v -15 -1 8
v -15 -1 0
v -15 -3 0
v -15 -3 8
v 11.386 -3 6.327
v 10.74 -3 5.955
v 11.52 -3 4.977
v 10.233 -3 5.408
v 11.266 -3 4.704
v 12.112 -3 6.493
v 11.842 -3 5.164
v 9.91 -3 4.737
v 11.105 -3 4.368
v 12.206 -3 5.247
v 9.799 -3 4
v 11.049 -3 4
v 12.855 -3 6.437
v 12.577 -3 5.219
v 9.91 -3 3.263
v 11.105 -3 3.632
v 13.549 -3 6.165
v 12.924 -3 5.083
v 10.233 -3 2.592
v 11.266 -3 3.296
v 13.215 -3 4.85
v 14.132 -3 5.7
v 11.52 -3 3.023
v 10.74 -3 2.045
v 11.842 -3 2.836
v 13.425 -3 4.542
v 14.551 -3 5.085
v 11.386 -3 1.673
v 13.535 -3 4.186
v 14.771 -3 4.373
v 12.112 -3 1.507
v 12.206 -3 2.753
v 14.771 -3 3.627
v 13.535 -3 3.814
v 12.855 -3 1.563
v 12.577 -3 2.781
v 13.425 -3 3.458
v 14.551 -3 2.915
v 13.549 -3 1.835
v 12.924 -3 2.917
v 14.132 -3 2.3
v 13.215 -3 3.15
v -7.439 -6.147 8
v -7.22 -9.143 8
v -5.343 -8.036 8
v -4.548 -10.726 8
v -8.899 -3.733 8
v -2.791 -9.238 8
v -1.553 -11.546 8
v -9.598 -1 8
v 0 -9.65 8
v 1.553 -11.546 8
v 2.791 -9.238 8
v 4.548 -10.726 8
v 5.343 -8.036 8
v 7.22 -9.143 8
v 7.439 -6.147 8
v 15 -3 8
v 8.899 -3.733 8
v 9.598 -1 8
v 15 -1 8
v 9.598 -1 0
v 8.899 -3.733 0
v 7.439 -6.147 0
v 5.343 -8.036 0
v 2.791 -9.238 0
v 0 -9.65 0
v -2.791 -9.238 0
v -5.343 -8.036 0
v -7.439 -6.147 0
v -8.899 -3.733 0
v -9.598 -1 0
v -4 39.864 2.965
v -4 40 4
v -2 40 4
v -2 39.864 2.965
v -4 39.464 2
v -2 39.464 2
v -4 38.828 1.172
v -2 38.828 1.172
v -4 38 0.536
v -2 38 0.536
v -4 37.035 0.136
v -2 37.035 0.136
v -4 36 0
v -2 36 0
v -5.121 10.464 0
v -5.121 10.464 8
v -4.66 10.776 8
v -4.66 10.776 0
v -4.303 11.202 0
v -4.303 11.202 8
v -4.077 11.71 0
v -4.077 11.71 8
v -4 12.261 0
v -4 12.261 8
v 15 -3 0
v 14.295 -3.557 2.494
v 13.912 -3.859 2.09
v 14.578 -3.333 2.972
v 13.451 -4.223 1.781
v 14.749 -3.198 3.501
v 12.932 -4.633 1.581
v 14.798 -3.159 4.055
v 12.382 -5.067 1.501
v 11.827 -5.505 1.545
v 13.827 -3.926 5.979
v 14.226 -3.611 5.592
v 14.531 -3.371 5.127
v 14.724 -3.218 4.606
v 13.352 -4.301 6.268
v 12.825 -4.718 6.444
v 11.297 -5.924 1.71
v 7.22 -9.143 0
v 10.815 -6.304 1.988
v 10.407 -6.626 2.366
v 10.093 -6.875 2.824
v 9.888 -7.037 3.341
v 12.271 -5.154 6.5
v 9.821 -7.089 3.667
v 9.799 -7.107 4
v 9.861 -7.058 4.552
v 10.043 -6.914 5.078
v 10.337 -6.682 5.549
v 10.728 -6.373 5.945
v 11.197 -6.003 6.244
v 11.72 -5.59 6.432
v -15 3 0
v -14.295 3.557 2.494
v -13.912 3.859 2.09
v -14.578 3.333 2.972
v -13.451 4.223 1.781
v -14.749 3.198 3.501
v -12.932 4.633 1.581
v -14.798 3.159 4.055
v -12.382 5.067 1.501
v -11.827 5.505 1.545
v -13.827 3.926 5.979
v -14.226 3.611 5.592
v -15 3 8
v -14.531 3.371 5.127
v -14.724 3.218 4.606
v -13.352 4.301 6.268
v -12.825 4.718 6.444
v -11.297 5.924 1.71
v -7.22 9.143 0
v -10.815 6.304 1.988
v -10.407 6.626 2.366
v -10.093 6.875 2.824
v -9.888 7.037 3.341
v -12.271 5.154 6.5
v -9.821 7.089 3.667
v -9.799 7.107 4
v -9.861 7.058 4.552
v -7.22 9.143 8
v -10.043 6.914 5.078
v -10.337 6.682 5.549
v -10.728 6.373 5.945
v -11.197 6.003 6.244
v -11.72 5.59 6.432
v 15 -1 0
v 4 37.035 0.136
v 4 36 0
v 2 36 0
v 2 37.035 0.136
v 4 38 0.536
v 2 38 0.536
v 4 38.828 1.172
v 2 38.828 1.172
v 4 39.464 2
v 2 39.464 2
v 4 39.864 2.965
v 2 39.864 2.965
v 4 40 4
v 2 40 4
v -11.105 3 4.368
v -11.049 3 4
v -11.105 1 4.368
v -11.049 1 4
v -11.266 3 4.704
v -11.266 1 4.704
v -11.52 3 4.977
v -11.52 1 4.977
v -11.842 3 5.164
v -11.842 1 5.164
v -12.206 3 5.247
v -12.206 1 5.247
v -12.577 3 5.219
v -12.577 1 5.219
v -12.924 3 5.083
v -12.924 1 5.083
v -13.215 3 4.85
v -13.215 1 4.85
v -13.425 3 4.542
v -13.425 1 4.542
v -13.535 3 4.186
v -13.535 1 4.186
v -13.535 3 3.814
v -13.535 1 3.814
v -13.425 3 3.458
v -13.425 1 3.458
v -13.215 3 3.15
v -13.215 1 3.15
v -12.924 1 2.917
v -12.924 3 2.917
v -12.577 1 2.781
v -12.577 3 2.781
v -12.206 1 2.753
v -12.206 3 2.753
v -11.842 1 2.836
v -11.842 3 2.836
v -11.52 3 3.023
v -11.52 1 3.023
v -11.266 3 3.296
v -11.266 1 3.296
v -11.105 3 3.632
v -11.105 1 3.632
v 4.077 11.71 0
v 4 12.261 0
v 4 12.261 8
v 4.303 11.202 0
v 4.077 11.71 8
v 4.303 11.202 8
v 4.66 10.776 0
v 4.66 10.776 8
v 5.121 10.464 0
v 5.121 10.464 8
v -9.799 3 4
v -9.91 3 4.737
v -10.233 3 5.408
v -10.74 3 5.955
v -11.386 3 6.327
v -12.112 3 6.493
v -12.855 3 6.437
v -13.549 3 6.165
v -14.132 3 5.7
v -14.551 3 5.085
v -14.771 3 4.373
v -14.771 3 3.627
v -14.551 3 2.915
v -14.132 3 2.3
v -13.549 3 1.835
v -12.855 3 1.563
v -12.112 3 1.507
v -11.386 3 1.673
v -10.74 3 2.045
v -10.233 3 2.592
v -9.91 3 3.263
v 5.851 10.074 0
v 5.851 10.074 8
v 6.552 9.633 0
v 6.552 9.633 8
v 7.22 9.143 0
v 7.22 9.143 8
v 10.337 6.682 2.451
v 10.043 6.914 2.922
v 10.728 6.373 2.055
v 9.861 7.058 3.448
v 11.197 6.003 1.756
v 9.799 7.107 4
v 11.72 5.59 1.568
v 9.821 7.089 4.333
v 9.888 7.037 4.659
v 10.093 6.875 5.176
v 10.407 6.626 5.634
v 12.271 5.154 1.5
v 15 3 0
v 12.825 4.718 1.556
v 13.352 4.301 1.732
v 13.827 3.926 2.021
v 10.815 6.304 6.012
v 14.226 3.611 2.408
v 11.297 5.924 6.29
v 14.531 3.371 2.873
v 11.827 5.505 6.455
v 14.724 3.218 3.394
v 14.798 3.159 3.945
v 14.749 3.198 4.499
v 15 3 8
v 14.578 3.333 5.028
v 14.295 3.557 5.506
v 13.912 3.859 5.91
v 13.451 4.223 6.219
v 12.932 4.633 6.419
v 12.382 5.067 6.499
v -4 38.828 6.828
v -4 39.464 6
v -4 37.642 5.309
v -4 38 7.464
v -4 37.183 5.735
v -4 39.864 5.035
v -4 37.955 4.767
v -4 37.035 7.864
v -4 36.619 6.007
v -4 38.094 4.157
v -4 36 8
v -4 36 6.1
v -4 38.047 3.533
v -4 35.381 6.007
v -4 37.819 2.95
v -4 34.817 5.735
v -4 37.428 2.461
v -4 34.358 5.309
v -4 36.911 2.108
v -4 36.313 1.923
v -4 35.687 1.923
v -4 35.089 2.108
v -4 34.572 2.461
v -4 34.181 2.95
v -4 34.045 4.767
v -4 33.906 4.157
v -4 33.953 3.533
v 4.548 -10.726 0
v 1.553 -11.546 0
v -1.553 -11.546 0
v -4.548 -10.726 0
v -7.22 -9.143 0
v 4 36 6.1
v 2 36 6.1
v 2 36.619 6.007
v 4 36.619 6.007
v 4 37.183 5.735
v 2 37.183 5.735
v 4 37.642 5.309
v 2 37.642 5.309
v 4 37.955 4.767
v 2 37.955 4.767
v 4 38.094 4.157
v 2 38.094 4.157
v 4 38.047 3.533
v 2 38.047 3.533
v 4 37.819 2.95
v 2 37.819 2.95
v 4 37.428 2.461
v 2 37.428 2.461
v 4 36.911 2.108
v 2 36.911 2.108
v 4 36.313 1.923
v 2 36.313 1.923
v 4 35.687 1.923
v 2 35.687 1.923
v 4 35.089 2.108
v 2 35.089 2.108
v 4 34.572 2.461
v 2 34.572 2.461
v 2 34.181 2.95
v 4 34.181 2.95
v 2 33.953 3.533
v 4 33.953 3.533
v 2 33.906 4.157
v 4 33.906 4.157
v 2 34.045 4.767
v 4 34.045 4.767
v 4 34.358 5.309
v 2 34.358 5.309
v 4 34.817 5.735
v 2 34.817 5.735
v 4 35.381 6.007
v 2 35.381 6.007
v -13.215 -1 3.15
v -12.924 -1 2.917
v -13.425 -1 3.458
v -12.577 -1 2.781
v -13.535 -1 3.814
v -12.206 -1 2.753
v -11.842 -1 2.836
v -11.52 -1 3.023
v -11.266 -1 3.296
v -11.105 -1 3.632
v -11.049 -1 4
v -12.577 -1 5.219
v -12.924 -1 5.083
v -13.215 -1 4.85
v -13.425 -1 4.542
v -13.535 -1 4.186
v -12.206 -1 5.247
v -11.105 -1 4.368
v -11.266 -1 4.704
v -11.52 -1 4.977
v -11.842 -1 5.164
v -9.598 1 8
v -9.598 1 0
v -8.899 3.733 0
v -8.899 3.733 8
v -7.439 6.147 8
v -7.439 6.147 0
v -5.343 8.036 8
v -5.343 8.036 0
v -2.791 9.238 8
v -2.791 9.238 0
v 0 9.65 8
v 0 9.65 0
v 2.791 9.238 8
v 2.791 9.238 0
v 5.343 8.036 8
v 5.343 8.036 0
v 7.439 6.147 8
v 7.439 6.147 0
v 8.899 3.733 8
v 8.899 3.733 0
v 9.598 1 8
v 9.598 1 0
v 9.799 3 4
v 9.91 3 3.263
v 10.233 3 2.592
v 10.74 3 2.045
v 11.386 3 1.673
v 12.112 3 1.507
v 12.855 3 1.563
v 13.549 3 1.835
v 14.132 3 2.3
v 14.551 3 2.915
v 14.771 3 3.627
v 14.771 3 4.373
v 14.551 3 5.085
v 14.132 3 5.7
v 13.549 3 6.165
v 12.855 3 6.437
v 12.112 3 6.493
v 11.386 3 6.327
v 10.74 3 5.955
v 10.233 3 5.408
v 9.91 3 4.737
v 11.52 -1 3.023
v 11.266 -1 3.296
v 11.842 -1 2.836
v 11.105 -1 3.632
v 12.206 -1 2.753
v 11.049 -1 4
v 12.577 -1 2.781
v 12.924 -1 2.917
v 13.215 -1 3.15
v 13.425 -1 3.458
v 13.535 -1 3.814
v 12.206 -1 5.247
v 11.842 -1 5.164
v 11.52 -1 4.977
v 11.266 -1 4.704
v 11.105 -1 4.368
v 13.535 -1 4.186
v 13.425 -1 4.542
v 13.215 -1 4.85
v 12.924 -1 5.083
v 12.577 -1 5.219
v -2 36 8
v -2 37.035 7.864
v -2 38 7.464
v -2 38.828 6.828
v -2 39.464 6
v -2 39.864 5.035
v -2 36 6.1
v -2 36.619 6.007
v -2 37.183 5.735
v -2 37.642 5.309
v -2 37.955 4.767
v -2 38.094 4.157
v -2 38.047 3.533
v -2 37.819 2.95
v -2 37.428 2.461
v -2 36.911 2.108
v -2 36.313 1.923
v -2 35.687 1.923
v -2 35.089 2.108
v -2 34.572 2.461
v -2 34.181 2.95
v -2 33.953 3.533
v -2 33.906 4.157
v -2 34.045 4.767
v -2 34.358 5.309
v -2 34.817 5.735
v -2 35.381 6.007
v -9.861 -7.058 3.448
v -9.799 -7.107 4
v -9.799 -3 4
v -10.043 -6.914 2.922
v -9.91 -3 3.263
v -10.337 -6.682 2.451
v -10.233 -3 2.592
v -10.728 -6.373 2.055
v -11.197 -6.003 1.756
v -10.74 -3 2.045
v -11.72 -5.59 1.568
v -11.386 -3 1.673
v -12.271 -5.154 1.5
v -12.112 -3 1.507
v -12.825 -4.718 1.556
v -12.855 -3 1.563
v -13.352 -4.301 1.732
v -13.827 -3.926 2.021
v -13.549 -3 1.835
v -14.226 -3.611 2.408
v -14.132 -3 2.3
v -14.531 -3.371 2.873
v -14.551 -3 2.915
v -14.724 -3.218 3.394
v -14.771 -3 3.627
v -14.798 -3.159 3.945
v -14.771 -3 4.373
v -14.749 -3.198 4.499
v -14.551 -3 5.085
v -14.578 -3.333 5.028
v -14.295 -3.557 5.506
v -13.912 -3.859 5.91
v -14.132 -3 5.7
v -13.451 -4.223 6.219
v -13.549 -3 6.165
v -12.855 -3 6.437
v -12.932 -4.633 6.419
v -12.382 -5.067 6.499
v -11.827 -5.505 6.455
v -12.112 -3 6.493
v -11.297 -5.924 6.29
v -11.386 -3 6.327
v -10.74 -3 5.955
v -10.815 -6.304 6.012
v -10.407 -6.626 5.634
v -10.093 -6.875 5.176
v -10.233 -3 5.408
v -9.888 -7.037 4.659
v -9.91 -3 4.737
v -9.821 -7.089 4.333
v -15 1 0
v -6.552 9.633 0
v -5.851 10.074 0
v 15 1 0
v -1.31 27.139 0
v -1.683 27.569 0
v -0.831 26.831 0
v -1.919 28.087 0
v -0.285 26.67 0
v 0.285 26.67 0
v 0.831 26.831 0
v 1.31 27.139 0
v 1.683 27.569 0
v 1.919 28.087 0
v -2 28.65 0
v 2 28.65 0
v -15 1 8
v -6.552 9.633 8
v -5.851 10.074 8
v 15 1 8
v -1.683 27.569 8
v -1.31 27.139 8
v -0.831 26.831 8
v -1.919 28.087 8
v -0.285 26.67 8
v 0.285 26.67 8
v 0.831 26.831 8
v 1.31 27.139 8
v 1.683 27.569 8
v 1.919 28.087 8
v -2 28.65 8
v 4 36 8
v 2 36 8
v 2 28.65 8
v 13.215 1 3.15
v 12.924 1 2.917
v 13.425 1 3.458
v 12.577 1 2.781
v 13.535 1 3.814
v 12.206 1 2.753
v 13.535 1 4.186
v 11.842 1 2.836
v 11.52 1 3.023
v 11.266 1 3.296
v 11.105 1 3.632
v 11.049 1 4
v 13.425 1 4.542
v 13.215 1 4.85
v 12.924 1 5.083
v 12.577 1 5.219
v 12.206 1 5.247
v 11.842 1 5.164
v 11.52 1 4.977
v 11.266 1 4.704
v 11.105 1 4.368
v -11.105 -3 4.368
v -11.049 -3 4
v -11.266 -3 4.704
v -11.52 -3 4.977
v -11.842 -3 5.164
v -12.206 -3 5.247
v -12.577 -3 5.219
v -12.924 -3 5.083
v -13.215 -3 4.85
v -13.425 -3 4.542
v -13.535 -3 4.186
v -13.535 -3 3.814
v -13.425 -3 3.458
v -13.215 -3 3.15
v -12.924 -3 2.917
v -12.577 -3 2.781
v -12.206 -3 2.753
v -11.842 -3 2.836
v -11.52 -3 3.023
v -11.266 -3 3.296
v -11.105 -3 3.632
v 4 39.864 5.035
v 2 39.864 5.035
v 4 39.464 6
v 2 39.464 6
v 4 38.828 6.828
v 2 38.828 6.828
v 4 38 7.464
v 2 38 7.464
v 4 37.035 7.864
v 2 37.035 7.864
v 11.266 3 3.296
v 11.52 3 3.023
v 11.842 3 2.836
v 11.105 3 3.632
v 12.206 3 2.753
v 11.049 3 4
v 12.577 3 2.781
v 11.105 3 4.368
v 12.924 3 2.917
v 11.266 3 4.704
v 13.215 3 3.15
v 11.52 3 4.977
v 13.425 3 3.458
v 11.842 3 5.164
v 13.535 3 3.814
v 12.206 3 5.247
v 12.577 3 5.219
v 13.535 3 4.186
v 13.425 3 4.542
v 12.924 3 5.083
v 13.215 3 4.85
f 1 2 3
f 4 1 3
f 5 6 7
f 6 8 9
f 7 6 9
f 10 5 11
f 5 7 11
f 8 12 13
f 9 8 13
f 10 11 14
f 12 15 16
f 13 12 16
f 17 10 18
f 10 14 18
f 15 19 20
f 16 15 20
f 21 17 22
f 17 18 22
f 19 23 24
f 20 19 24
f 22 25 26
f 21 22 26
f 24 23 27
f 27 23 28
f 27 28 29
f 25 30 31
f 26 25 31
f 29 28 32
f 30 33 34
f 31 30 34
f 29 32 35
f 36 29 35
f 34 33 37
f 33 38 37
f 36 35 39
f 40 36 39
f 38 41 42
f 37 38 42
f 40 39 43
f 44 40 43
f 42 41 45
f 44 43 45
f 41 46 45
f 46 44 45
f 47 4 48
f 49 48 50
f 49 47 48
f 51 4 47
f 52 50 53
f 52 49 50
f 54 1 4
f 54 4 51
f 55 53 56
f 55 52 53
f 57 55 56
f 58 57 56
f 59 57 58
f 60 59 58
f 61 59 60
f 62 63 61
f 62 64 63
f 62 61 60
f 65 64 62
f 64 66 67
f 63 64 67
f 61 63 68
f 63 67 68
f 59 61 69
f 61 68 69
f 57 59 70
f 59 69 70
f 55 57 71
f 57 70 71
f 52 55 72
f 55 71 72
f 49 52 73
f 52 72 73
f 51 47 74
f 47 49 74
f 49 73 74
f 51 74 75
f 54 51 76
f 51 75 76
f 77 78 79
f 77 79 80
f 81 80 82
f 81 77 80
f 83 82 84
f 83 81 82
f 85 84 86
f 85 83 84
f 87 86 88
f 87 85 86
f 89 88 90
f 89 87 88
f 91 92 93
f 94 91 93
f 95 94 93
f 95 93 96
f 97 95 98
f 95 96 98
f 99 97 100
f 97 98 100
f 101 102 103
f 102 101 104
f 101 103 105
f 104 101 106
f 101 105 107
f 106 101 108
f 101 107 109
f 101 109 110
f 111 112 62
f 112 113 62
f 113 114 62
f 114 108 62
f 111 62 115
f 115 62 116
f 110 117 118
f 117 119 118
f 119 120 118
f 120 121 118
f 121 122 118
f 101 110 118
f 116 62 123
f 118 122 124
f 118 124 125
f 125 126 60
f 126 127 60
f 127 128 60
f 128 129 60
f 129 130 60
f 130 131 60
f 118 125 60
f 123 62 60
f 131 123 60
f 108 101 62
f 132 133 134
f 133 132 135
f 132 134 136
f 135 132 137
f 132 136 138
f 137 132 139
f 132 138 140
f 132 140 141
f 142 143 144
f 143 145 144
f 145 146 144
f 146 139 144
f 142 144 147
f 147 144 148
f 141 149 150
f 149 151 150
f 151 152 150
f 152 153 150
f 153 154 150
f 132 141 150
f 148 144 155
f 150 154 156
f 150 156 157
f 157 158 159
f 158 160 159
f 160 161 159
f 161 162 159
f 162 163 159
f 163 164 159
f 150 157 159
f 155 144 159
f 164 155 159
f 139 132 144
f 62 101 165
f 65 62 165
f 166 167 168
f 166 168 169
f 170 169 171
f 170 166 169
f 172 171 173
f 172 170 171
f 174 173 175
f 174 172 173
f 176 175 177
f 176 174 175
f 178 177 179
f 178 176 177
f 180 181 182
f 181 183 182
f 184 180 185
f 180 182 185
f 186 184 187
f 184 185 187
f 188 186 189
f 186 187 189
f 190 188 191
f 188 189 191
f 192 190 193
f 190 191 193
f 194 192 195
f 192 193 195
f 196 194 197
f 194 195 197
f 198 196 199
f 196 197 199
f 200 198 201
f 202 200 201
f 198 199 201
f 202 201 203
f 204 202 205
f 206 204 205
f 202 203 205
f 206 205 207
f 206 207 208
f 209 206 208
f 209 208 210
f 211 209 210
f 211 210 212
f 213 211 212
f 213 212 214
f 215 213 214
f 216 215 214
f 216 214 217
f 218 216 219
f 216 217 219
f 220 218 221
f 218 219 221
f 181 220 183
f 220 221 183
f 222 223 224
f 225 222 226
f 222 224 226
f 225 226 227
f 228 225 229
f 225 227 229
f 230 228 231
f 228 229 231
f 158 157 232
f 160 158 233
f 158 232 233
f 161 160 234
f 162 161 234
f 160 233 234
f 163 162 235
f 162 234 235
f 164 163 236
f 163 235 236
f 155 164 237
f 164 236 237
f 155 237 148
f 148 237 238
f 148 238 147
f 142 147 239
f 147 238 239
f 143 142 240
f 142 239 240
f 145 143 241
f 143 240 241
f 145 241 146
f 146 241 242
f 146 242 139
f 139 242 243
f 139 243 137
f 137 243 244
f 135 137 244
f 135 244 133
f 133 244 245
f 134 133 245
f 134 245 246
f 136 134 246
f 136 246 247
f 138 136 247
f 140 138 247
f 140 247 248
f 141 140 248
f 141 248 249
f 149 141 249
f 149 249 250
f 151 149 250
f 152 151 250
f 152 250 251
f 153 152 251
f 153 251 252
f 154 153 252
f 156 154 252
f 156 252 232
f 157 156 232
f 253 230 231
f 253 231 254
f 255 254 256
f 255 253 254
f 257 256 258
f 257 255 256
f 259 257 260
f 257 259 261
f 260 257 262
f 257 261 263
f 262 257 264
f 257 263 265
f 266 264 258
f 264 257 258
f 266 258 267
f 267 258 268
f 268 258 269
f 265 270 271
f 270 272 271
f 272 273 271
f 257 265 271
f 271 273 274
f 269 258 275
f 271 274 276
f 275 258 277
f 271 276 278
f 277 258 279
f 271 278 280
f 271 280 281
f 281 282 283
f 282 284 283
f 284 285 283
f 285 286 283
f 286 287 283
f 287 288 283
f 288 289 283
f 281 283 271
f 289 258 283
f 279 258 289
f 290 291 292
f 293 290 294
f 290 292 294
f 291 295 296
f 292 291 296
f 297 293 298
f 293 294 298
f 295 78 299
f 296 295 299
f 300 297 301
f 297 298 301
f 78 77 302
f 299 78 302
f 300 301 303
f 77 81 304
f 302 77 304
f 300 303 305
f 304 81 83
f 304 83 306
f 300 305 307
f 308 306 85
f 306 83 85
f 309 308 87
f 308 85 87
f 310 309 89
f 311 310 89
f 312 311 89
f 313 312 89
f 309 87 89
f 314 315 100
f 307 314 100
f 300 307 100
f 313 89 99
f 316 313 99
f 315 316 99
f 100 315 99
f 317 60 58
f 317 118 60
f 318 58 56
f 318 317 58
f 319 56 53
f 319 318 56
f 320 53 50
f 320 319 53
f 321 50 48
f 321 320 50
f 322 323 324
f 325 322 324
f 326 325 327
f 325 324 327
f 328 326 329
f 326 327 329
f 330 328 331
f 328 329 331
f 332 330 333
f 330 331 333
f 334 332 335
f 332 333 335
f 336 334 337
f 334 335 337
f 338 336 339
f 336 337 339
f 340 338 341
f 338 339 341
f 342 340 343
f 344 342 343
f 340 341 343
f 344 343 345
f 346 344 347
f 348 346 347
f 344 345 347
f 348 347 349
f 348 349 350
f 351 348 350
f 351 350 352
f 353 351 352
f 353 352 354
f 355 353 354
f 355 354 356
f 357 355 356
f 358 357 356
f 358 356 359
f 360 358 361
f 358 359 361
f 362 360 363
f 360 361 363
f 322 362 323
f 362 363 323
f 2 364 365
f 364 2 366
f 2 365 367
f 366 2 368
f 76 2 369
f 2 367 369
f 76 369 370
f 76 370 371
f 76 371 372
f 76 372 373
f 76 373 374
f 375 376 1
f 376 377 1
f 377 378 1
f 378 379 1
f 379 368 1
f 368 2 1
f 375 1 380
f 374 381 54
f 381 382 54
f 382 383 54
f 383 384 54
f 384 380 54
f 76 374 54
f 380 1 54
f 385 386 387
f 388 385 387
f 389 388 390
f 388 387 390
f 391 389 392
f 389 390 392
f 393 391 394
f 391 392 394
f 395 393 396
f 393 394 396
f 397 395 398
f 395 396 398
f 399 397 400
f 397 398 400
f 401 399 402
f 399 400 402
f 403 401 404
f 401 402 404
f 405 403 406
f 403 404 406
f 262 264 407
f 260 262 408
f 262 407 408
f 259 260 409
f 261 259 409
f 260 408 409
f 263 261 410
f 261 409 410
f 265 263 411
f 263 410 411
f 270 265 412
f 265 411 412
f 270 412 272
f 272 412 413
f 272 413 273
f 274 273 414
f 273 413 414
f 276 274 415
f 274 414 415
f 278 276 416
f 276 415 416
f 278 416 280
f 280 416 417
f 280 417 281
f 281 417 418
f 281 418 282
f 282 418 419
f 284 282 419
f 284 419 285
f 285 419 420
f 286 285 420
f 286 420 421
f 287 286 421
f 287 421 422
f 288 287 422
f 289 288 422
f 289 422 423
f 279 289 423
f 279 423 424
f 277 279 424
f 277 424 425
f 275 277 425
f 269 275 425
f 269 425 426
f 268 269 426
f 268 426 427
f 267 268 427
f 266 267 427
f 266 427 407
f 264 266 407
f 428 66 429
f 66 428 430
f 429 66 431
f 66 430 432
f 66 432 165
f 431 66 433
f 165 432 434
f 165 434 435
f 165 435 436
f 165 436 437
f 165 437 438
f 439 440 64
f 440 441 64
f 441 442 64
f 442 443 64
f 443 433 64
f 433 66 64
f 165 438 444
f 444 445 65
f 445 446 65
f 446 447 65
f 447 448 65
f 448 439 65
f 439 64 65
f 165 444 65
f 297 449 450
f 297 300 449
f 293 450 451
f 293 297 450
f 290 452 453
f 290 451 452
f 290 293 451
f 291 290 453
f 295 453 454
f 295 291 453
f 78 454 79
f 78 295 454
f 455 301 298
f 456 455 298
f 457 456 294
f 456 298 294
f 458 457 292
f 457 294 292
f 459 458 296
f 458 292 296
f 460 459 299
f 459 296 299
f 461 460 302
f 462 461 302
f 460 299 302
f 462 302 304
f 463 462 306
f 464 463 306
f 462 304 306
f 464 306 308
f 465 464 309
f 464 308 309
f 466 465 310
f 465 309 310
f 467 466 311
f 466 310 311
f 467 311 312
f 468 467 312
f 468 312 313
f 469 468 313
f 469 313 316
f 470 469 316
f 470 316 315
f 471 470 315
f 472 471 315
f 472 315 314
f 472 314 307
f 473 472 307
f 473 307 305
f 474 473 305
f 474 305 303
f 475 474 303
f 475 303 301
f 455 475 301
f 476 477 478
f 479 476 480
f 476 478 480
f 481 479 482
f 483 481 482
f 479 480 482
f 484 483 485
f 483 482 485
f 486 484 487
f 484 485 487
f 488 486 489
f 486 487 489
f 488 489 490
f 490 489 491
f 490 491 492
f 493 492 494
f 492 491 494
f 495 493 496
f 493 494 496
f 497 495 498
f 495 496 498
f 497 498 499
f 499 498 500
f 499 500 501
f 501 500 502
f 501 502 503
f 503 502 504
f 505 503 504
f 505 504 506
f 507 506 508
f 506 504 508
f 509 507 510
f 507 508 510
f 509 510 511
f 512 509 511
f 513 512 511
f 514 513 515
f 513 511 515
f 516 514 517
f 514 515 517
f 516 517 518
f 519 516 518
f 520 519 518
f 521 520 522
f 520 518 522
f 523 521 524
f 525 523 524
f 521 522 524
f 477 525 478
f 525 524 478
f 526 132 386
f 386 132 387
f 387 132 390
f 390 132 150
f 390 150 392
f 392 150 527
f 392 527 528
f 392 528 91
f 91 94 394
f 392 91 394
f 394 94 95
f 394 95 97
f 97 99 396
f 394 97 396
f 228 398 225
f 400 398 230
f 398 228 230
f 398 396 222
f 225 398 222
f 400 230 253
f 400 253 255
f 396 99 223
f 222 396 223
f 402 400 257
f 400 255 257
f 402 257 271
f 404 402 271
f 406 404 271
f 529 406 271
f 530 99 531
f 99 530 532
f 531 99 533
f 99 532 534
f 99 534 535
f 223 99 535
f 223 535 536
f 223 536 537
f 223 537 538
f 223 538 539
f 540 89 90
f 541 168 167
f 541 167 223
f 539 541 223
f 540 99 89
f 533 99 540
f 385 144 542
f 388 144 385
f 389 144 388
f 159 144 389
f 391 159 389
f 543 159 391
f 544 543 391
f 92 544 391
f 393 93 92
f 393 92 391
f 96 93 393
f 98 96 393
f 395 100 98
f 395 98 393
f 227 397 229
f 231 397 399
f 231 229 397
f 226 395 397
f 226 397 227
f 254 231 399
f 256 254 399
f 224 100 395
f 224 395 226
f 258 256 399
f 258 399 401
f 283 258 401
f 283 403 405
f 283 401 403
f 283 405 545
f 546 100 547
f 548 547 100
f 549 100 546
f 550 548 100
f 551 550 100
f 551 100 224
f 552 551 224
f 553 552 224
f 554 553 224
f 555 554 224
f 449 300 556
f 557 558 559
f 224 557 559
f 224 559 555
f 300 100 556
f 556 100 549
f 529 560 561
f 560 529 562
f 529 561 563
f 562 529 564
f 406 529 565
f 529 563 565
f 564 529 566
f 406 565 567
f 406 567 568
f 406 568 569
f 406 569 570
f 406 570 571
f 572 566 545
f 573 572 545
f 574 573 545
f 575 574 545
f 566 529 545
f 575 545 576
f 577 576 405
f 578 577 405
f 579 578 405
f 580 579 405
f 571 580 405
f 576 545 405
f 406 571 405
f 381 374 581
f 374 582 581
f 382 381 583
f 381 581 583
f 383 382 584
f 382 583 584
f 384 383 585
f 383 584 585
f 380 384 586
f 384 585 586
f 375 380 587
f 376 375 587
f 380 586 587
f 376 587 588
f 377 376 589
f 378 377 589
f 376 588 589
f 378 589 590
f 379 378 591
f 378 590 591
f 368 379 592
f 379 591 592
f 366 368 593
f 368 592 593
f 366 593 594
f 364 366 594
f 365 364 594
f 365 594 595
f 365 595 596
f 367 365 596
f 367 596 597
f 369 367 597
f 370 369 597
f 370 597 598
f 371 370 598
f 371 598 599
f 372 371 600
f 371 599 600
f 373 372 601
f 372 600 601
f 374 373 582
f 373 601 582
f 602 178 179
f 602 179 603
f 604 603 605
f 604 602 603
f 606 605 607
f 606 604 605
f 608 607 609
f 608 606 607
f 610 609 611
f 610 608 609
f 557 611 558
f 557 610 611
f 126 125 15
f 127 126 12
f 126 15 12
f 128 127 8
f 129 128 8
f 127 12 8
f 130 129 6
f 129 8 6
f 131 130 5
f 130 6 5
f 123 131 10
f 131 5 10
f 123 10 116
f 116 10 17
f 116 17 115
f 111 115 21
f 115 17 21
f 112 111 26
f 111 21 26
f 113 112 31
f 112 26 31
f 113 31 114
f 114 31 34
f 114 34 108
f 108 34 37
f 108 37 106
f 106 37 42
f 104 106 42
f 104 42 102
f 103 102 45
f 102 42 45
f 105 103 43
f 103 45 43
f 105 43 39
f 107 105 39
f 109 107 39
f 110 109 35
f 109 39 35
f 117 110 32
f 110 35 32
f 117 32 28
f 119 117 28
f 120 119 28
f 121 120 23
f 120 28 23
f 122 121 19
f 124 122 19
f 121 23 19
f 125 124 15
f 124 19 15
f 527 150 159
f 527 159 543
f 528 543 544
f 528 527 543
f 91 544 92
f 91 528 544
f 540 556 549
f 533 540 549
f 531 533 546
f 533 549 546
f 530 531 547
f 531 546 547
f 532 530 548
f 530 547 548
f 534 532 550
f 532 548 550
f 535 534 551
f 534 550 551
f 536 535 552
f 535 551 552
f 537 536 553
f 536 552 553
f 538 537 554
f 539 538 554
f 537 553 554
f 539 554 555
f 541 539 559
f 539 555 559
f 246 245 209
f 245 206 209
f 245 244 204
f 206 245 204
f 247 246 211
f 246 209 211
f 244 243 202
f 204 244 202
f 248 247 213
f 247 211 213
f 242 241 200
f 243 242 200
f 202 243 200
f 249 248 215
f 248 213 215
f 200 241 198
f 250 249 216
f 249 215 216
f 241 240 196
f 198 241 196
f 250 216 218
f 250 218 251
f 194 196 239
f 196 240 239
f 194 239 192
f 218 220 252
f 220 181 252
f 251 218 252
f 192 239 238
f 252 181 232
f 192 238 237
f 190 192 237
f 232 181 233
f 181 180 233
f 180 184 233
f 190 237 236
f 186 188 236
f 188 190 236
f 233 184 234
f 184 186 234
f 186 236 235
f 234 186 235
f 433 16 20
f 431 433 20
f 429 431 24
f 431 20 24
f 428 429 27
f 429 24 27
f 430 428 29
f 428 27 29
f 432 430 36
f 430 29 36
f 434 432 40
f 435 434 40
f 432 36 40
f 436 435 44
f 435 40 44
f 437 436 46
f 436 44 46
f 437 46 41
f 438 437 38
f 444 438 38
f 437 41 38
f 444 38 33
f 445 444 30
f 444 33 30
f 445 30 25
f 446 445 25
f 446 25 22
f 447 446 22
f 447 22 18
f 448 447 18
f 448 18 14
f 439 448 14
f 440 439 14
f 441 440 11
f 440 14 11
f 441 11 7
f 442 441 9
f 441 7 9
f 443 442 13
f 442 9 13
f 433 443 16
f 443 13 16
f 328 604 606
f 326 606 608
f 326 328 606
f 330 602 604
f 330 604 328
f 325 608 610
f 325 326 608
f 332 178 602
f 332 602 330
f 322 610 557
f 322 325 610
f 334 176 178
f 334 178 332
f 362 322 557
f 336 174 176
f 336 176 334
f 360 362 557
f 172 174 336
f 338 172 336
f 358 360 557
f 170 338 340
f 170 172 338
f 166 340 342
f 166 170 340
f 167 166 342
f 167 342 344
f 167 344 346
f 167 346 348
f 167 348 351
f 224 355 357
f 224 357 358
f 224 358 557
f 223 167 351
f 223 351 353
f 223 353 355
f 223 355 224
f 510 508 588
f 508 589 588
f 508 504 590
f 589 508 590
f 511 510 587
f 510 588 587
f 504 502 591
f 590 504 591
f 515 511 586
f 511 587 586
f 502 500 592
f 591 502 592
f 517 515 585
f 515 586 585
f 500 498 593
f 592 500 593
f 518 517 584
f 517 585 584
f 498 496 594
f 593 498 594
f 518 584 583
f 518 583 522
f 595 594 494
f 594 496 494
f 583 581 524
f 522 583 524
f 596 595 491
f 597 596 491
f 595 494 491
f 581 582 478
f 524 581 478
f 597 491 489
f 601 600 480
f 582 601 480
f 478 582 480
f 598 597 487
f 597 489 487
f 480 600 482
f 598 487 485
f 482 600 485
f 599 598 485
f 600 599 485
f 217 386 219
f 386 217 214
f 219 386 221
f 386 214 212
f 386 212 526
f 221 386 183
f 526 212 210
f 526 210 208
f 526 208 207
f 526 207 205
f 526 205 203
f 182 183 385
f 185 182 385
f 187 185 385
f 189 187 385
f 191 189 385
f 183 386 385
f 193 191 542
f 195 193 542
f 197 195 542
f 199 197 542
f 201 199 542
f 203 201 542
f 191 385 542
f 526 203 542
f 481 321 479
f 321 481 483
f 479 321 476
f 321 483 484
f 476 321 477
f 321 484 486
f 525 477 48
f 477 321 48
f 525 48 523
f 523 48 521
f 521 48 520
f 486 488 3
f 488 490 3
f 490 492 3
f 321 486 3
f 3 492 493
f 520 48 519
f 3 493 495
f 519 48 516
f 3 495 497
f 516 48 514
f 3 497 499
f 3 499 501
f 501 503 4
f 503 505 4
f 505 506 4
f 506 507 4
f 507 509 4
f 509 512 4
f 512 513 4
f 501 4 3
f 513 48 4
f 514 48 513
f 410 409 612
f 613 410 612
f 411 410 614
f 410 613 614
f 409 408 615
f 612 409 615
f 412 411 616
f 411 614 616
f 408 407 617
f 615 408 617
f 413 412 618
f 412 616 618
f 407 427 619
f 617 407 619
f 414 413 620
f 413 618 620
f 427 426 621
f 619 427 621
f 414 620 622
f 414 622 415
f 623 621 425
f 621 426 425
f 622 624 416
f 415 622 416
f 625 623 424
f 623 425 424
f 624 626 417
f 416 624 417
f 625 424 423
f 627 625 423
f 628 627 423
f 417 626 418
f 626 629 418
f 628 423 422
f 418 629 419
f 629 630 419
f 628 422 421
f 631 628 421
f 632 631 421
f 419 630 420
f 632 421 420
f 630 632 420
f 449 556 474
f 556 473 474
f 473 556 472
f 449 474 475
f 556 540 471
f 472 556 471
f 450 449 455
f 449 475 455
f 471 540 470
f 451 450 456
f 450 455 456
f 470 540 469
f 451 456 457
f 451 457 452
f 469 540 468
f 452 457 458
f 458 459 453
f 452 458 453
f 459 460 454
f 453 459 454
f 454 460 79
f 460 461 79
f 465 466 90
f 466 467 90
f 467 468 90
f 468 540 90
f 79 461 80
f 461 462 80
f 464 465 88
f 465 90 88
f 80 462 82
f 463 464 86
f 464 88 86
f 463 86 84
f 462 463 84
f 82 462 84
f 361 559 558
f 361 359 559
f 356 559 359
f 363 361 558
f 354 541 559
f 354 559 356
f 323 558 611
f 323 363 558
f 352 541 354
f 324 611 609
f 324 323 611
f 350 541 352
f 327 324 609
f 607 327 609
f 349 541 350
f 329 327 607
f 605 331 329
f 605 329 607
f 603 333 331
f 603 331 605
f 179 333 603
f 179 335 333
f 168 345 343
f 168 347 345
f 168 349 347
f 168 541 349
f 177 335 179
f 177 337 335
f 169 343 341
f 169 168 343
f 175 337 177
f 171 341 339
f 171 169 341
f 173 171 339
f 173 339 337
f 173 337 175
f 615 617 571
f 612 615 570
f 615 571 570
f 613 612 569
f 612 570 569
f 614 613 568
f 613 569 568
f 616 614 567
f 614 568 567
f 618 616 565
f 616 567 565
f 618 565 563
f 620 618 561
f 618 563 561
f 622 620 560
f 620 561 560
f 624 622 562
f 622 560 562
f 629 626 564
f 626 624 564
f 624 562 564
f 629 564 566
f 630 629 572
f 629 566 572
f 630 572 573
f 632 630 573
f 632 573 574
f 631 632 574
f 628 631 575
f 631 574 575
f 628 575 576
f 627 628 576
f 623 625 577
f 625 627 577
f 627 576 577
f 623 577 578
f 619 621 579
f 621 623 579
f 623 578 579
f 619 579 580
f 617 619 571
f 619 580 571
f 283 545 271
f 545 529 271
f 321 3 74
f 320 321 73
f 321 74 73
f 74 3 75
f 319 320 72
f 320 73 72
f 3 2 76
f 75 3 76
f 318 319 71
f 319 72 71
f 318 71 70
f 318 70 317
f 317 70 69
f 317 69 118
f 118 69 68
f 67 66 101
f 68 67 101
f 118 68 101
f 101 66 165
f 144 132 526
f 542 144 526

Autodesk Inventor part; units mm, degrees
ref_plane "YZ Plane" through (0, 0, 0) normal (1, 0, 0) x (0, 1, 0)
sketch "Sketch1" plane through (0, 0, 0) normal (0, 0, 1) x (1, 0, 0)
  circle A0 centre (0, 0) radius 9.65
  circle A1 centre (0, 0) radius 11.65
  line L0 (15, -3) -> (15, 3)
  line L1 (-15, 3) -> (-15, -3)
  line L2 (-15, -3) -> (15, 3) construction
  line L3 (15, -3) -> (-15, 3) construction
  line L4 (-15, -3) -> (-9.1718, -3)
  line L5 (9.1718, -3) -> (15, -3)
  line L6 (15, 3) -> (9.1718, 3)
  line L7 (-9.1718, 3) -> (-15, 3)
  dimension "d0" = 19.3
  dimension "d1" = 2
  dimension "d2" = 30
  dimension "d3" = 6
extrude "Extrusion1" add sketch "Sketch1" along normal blind 8 contours A0 L6 A1 L5 | A0 L7 A1 L6 | L5 A1 L4 A0 | A0 L4 A1 L7 | L6 L0 L5 A1 | A1 L4 L1 L7
sketch "Sketch2" plane through (0, 0, 8) normal (0, 0, 1) x (1, 0, 0)
  line L0 (-15, 3) -> (-15, -3) projected
  line L1 (-15, 3) -> (-7.2195, 9.1434)
  line L2 (15, 3) -> (11.2571, 3) projected
  line L3 (7.2195, 9.1434) -> (15, 3)
  line L4 (-15, -3) -> (-11.2571, -3) projected
  line L5 (-7.2195, -9.1434) -> (-15, -3)
  arc A0 (11.2571, 3) -> (-11.2571, 3) centre (0, 0) ccw projected
  arc A1 (-11.2571, -3) -> (11.2571, -3) centre (0, 0) ccw projected
  line L6 (11.2571, -3) -> (15, -3) projected
  line L7 (15, -3) -> (7.2195, -9.1434)
  line L8 (-11.2571, 3) -> (-15, 3) projected
extrude "Extrusion2" add sketch "Sketch2" against normal blind 8
sketch "Sketch3" plane through (0, 0, 8) normal (0, 0, 1) x (1, 0, 0)
  line L0 (-24.7008, -1) -> (24.7008, -1)
  line L1 (24.7008, -1) -> (24.7008, 1)
  line L2 (24.7008, 1) -> (-24.7008, 1)
  line L3 (-24.7008, 1) -> (-24.7008, -1)
  line L4 (-24.7008, -1) -> (24.7008, 1) construction
  line L5 (24.7008, -1) -> (-24.7008, 1) construction
  point P0 (0, 0)
  dimension "d8" = 2
extrude "Extrusion3" cut sketch "Sketch3" against normal through all
sketch "Sketch4" plane through (0, 0, 0) normal (0, 0, -1) x (-1, 0, 0)
  line L0 (-4, 0) -> (-2, 0)
  line L1 (-2, 11.477) -> (-2, 40)
  line L2 (-2, 40) -> (-4, 40)
  line L3 (-4, 40) -> (-4, 10.9418)
  line L4 (2, 40) -> (4, 40)
  line L5 (4, 40) -> (4, 10.9418)
  line L6 (4, 0) -> (2, 0)
  line L7 (2, 11.477) -> (2, 40)
  arc A0 (7.2195, 9.1434) -> (-7.2195, 9.1434) centre (0, 0) ccw projected
  point P0 (-3, 0)
  dimension "d11" = 2
  dimension "d12" = 2
  dimension "d13" = 4
  dimension "d14" = 2
  dimension "d15" = 40
extrude "Extrusion4" add sketch "Sketch4" against normal blind 8
fillet "Fillet1" radius 2 4 edges at (-4, 10.9418, 4) (-2, 11.477, 4) (2, 11.477, 4) (4, 10.9418, 4)
fillet "Fillet2" radius 4 4 edges at (-3, 40, 0) (3, 40, 0) (3, 40, 8) (-3, 40, 8)
ref_plane "Work Plane1" through (-15, -3, 8) normal (0, 1, 0) x (1, 0, 0)
sketch "Sketch5" plane through (-15, -3, 8) normal (0, 1, 0) x (1, 0, 0)
  line L0 (0, 8) -> (5.402, 8) projected
  line L1 (0, 0) -> (0, 8) projected
  circle A0 centre (2.701, 4) radius 2.5
  point P0 (15, 8)
  dimension "d21" = 5
extrude "Extrusion5" cut sketch "Sketch5" against normal blind 8
sketch "Sketch6" plane through (-12.299, -3, 4) normal (0, -1, 0) x (1, 0, 0)
  circle A0 centre (0, 0) radius 1.25
  point P0 (12.299, -4)
  dimension "d24" = 2.5
extrude "Extrusion6" cut sketch "Sketch6" against normal blind 12
ref_plane "Work Plane2" through (-15, 3, 8) normal (0, -1, 0) x (1, 0, 0)
sketch "Sketch7" plane through (-15, 3, 8) normal (0, -1, 0) x (1, 0, 0)
  circle A0 centre (2.701, -4) radius 1.25 projected
  circle A1 centre (2.701, -4) radius 2.5 projected
  point P0 (15, -8)
extrude "Extrusion7" cut sketch "Sketch7" against normal blind 12
mirror "Mirror1" about plane through (0, 0, 0) normal (1, 0, 0) of "Extrusion7", "Extrusion6", "Extrusion5"
sketch "Sketch8" plane through (-4, 12.2606, 0) normal (-1, 0, 0) x (0, 0, 1)
  arc A0 (8, 23.7394) -> (0, 23.7394) centre (4, 23.7394) ccw projected
  line L0 (0, 0) -> (0, 23.7394) projected
  line L1 (8, 0) -> (0, 0) projected
  line L2 (8, 23.7394) -> (8, 0) projected
  circle A1 centre (4, 23.7394) radius 2.1
  point P0 (0, -12.2606)
  dimension "d30" = 4.2
extrude "Extrusion8" cut sketch "Sketch8" against normal through all contours A1
sketch "Sketch9" plane through (0, 0, 8) normal (0, 0, 1) x (1, 0, 0)
  line L0 (-4, 36) -> (-2, 36) projected
  line L1 (-4, 36) -> (-4, 12.2606) projected
  arc A0 (-5.1209, 10.4642) -> (-4, 12.2606) centre (-6, 12.2606) ccw projected
  arc A1 (-5.1209, 10.4642) -> (-7.2195, 9.1434) centre (0, 0) ccw projected
  line L2 (-7.2195, 9.1434) -> (-15, 3) projected
  line L3 (-15, 3) -> (-15, 1) projected
  line L4 (-15, 1) -> (-9.598, 1) projected
  arc A2 (9.598, 1) -> (-9.598, 1) centre (0, 0) ccw projected
  line L5 (9.598, 1) -> (15, 1) projected
  line L6 (15, 1) -> (15, 3) projected
  line L7 (15, 3) -> (7.2195, 9.1434) projected
  arc A3 (7.2195, 9.1434) -> (5.1209, 10.4642) centre (0, 0) ccw projected
  arc A4 (4, 12.2606) -> (5.1209, 10.4642) centre (6, 12.2606) ccw projected
  line L8 (4, 12.2606) -> (4, 36) projected
  line L9 (2, 36) -> (4, 36) projected
  line L10 (2, 36) -> (2, 13.65) projected
  arc A5 (-2, 13.65) -> (2, 13.65) centre (0, 13.65) ccw projected
  line L11 (-2, 13.65) -> (-2, 36) projected
  arc A6 (-2, 28.65) -> (2, 28.65) centre (0, 28.65) ccw
  line L12 (2, 36) -> (2, 13.65) projected
  dimension "d33" = 15
extrude "Extrusion9" add sketch "Sketch9" against normal blind 8 contours A6 L10 A5 L11
properties part number "Potentiometer arm"
